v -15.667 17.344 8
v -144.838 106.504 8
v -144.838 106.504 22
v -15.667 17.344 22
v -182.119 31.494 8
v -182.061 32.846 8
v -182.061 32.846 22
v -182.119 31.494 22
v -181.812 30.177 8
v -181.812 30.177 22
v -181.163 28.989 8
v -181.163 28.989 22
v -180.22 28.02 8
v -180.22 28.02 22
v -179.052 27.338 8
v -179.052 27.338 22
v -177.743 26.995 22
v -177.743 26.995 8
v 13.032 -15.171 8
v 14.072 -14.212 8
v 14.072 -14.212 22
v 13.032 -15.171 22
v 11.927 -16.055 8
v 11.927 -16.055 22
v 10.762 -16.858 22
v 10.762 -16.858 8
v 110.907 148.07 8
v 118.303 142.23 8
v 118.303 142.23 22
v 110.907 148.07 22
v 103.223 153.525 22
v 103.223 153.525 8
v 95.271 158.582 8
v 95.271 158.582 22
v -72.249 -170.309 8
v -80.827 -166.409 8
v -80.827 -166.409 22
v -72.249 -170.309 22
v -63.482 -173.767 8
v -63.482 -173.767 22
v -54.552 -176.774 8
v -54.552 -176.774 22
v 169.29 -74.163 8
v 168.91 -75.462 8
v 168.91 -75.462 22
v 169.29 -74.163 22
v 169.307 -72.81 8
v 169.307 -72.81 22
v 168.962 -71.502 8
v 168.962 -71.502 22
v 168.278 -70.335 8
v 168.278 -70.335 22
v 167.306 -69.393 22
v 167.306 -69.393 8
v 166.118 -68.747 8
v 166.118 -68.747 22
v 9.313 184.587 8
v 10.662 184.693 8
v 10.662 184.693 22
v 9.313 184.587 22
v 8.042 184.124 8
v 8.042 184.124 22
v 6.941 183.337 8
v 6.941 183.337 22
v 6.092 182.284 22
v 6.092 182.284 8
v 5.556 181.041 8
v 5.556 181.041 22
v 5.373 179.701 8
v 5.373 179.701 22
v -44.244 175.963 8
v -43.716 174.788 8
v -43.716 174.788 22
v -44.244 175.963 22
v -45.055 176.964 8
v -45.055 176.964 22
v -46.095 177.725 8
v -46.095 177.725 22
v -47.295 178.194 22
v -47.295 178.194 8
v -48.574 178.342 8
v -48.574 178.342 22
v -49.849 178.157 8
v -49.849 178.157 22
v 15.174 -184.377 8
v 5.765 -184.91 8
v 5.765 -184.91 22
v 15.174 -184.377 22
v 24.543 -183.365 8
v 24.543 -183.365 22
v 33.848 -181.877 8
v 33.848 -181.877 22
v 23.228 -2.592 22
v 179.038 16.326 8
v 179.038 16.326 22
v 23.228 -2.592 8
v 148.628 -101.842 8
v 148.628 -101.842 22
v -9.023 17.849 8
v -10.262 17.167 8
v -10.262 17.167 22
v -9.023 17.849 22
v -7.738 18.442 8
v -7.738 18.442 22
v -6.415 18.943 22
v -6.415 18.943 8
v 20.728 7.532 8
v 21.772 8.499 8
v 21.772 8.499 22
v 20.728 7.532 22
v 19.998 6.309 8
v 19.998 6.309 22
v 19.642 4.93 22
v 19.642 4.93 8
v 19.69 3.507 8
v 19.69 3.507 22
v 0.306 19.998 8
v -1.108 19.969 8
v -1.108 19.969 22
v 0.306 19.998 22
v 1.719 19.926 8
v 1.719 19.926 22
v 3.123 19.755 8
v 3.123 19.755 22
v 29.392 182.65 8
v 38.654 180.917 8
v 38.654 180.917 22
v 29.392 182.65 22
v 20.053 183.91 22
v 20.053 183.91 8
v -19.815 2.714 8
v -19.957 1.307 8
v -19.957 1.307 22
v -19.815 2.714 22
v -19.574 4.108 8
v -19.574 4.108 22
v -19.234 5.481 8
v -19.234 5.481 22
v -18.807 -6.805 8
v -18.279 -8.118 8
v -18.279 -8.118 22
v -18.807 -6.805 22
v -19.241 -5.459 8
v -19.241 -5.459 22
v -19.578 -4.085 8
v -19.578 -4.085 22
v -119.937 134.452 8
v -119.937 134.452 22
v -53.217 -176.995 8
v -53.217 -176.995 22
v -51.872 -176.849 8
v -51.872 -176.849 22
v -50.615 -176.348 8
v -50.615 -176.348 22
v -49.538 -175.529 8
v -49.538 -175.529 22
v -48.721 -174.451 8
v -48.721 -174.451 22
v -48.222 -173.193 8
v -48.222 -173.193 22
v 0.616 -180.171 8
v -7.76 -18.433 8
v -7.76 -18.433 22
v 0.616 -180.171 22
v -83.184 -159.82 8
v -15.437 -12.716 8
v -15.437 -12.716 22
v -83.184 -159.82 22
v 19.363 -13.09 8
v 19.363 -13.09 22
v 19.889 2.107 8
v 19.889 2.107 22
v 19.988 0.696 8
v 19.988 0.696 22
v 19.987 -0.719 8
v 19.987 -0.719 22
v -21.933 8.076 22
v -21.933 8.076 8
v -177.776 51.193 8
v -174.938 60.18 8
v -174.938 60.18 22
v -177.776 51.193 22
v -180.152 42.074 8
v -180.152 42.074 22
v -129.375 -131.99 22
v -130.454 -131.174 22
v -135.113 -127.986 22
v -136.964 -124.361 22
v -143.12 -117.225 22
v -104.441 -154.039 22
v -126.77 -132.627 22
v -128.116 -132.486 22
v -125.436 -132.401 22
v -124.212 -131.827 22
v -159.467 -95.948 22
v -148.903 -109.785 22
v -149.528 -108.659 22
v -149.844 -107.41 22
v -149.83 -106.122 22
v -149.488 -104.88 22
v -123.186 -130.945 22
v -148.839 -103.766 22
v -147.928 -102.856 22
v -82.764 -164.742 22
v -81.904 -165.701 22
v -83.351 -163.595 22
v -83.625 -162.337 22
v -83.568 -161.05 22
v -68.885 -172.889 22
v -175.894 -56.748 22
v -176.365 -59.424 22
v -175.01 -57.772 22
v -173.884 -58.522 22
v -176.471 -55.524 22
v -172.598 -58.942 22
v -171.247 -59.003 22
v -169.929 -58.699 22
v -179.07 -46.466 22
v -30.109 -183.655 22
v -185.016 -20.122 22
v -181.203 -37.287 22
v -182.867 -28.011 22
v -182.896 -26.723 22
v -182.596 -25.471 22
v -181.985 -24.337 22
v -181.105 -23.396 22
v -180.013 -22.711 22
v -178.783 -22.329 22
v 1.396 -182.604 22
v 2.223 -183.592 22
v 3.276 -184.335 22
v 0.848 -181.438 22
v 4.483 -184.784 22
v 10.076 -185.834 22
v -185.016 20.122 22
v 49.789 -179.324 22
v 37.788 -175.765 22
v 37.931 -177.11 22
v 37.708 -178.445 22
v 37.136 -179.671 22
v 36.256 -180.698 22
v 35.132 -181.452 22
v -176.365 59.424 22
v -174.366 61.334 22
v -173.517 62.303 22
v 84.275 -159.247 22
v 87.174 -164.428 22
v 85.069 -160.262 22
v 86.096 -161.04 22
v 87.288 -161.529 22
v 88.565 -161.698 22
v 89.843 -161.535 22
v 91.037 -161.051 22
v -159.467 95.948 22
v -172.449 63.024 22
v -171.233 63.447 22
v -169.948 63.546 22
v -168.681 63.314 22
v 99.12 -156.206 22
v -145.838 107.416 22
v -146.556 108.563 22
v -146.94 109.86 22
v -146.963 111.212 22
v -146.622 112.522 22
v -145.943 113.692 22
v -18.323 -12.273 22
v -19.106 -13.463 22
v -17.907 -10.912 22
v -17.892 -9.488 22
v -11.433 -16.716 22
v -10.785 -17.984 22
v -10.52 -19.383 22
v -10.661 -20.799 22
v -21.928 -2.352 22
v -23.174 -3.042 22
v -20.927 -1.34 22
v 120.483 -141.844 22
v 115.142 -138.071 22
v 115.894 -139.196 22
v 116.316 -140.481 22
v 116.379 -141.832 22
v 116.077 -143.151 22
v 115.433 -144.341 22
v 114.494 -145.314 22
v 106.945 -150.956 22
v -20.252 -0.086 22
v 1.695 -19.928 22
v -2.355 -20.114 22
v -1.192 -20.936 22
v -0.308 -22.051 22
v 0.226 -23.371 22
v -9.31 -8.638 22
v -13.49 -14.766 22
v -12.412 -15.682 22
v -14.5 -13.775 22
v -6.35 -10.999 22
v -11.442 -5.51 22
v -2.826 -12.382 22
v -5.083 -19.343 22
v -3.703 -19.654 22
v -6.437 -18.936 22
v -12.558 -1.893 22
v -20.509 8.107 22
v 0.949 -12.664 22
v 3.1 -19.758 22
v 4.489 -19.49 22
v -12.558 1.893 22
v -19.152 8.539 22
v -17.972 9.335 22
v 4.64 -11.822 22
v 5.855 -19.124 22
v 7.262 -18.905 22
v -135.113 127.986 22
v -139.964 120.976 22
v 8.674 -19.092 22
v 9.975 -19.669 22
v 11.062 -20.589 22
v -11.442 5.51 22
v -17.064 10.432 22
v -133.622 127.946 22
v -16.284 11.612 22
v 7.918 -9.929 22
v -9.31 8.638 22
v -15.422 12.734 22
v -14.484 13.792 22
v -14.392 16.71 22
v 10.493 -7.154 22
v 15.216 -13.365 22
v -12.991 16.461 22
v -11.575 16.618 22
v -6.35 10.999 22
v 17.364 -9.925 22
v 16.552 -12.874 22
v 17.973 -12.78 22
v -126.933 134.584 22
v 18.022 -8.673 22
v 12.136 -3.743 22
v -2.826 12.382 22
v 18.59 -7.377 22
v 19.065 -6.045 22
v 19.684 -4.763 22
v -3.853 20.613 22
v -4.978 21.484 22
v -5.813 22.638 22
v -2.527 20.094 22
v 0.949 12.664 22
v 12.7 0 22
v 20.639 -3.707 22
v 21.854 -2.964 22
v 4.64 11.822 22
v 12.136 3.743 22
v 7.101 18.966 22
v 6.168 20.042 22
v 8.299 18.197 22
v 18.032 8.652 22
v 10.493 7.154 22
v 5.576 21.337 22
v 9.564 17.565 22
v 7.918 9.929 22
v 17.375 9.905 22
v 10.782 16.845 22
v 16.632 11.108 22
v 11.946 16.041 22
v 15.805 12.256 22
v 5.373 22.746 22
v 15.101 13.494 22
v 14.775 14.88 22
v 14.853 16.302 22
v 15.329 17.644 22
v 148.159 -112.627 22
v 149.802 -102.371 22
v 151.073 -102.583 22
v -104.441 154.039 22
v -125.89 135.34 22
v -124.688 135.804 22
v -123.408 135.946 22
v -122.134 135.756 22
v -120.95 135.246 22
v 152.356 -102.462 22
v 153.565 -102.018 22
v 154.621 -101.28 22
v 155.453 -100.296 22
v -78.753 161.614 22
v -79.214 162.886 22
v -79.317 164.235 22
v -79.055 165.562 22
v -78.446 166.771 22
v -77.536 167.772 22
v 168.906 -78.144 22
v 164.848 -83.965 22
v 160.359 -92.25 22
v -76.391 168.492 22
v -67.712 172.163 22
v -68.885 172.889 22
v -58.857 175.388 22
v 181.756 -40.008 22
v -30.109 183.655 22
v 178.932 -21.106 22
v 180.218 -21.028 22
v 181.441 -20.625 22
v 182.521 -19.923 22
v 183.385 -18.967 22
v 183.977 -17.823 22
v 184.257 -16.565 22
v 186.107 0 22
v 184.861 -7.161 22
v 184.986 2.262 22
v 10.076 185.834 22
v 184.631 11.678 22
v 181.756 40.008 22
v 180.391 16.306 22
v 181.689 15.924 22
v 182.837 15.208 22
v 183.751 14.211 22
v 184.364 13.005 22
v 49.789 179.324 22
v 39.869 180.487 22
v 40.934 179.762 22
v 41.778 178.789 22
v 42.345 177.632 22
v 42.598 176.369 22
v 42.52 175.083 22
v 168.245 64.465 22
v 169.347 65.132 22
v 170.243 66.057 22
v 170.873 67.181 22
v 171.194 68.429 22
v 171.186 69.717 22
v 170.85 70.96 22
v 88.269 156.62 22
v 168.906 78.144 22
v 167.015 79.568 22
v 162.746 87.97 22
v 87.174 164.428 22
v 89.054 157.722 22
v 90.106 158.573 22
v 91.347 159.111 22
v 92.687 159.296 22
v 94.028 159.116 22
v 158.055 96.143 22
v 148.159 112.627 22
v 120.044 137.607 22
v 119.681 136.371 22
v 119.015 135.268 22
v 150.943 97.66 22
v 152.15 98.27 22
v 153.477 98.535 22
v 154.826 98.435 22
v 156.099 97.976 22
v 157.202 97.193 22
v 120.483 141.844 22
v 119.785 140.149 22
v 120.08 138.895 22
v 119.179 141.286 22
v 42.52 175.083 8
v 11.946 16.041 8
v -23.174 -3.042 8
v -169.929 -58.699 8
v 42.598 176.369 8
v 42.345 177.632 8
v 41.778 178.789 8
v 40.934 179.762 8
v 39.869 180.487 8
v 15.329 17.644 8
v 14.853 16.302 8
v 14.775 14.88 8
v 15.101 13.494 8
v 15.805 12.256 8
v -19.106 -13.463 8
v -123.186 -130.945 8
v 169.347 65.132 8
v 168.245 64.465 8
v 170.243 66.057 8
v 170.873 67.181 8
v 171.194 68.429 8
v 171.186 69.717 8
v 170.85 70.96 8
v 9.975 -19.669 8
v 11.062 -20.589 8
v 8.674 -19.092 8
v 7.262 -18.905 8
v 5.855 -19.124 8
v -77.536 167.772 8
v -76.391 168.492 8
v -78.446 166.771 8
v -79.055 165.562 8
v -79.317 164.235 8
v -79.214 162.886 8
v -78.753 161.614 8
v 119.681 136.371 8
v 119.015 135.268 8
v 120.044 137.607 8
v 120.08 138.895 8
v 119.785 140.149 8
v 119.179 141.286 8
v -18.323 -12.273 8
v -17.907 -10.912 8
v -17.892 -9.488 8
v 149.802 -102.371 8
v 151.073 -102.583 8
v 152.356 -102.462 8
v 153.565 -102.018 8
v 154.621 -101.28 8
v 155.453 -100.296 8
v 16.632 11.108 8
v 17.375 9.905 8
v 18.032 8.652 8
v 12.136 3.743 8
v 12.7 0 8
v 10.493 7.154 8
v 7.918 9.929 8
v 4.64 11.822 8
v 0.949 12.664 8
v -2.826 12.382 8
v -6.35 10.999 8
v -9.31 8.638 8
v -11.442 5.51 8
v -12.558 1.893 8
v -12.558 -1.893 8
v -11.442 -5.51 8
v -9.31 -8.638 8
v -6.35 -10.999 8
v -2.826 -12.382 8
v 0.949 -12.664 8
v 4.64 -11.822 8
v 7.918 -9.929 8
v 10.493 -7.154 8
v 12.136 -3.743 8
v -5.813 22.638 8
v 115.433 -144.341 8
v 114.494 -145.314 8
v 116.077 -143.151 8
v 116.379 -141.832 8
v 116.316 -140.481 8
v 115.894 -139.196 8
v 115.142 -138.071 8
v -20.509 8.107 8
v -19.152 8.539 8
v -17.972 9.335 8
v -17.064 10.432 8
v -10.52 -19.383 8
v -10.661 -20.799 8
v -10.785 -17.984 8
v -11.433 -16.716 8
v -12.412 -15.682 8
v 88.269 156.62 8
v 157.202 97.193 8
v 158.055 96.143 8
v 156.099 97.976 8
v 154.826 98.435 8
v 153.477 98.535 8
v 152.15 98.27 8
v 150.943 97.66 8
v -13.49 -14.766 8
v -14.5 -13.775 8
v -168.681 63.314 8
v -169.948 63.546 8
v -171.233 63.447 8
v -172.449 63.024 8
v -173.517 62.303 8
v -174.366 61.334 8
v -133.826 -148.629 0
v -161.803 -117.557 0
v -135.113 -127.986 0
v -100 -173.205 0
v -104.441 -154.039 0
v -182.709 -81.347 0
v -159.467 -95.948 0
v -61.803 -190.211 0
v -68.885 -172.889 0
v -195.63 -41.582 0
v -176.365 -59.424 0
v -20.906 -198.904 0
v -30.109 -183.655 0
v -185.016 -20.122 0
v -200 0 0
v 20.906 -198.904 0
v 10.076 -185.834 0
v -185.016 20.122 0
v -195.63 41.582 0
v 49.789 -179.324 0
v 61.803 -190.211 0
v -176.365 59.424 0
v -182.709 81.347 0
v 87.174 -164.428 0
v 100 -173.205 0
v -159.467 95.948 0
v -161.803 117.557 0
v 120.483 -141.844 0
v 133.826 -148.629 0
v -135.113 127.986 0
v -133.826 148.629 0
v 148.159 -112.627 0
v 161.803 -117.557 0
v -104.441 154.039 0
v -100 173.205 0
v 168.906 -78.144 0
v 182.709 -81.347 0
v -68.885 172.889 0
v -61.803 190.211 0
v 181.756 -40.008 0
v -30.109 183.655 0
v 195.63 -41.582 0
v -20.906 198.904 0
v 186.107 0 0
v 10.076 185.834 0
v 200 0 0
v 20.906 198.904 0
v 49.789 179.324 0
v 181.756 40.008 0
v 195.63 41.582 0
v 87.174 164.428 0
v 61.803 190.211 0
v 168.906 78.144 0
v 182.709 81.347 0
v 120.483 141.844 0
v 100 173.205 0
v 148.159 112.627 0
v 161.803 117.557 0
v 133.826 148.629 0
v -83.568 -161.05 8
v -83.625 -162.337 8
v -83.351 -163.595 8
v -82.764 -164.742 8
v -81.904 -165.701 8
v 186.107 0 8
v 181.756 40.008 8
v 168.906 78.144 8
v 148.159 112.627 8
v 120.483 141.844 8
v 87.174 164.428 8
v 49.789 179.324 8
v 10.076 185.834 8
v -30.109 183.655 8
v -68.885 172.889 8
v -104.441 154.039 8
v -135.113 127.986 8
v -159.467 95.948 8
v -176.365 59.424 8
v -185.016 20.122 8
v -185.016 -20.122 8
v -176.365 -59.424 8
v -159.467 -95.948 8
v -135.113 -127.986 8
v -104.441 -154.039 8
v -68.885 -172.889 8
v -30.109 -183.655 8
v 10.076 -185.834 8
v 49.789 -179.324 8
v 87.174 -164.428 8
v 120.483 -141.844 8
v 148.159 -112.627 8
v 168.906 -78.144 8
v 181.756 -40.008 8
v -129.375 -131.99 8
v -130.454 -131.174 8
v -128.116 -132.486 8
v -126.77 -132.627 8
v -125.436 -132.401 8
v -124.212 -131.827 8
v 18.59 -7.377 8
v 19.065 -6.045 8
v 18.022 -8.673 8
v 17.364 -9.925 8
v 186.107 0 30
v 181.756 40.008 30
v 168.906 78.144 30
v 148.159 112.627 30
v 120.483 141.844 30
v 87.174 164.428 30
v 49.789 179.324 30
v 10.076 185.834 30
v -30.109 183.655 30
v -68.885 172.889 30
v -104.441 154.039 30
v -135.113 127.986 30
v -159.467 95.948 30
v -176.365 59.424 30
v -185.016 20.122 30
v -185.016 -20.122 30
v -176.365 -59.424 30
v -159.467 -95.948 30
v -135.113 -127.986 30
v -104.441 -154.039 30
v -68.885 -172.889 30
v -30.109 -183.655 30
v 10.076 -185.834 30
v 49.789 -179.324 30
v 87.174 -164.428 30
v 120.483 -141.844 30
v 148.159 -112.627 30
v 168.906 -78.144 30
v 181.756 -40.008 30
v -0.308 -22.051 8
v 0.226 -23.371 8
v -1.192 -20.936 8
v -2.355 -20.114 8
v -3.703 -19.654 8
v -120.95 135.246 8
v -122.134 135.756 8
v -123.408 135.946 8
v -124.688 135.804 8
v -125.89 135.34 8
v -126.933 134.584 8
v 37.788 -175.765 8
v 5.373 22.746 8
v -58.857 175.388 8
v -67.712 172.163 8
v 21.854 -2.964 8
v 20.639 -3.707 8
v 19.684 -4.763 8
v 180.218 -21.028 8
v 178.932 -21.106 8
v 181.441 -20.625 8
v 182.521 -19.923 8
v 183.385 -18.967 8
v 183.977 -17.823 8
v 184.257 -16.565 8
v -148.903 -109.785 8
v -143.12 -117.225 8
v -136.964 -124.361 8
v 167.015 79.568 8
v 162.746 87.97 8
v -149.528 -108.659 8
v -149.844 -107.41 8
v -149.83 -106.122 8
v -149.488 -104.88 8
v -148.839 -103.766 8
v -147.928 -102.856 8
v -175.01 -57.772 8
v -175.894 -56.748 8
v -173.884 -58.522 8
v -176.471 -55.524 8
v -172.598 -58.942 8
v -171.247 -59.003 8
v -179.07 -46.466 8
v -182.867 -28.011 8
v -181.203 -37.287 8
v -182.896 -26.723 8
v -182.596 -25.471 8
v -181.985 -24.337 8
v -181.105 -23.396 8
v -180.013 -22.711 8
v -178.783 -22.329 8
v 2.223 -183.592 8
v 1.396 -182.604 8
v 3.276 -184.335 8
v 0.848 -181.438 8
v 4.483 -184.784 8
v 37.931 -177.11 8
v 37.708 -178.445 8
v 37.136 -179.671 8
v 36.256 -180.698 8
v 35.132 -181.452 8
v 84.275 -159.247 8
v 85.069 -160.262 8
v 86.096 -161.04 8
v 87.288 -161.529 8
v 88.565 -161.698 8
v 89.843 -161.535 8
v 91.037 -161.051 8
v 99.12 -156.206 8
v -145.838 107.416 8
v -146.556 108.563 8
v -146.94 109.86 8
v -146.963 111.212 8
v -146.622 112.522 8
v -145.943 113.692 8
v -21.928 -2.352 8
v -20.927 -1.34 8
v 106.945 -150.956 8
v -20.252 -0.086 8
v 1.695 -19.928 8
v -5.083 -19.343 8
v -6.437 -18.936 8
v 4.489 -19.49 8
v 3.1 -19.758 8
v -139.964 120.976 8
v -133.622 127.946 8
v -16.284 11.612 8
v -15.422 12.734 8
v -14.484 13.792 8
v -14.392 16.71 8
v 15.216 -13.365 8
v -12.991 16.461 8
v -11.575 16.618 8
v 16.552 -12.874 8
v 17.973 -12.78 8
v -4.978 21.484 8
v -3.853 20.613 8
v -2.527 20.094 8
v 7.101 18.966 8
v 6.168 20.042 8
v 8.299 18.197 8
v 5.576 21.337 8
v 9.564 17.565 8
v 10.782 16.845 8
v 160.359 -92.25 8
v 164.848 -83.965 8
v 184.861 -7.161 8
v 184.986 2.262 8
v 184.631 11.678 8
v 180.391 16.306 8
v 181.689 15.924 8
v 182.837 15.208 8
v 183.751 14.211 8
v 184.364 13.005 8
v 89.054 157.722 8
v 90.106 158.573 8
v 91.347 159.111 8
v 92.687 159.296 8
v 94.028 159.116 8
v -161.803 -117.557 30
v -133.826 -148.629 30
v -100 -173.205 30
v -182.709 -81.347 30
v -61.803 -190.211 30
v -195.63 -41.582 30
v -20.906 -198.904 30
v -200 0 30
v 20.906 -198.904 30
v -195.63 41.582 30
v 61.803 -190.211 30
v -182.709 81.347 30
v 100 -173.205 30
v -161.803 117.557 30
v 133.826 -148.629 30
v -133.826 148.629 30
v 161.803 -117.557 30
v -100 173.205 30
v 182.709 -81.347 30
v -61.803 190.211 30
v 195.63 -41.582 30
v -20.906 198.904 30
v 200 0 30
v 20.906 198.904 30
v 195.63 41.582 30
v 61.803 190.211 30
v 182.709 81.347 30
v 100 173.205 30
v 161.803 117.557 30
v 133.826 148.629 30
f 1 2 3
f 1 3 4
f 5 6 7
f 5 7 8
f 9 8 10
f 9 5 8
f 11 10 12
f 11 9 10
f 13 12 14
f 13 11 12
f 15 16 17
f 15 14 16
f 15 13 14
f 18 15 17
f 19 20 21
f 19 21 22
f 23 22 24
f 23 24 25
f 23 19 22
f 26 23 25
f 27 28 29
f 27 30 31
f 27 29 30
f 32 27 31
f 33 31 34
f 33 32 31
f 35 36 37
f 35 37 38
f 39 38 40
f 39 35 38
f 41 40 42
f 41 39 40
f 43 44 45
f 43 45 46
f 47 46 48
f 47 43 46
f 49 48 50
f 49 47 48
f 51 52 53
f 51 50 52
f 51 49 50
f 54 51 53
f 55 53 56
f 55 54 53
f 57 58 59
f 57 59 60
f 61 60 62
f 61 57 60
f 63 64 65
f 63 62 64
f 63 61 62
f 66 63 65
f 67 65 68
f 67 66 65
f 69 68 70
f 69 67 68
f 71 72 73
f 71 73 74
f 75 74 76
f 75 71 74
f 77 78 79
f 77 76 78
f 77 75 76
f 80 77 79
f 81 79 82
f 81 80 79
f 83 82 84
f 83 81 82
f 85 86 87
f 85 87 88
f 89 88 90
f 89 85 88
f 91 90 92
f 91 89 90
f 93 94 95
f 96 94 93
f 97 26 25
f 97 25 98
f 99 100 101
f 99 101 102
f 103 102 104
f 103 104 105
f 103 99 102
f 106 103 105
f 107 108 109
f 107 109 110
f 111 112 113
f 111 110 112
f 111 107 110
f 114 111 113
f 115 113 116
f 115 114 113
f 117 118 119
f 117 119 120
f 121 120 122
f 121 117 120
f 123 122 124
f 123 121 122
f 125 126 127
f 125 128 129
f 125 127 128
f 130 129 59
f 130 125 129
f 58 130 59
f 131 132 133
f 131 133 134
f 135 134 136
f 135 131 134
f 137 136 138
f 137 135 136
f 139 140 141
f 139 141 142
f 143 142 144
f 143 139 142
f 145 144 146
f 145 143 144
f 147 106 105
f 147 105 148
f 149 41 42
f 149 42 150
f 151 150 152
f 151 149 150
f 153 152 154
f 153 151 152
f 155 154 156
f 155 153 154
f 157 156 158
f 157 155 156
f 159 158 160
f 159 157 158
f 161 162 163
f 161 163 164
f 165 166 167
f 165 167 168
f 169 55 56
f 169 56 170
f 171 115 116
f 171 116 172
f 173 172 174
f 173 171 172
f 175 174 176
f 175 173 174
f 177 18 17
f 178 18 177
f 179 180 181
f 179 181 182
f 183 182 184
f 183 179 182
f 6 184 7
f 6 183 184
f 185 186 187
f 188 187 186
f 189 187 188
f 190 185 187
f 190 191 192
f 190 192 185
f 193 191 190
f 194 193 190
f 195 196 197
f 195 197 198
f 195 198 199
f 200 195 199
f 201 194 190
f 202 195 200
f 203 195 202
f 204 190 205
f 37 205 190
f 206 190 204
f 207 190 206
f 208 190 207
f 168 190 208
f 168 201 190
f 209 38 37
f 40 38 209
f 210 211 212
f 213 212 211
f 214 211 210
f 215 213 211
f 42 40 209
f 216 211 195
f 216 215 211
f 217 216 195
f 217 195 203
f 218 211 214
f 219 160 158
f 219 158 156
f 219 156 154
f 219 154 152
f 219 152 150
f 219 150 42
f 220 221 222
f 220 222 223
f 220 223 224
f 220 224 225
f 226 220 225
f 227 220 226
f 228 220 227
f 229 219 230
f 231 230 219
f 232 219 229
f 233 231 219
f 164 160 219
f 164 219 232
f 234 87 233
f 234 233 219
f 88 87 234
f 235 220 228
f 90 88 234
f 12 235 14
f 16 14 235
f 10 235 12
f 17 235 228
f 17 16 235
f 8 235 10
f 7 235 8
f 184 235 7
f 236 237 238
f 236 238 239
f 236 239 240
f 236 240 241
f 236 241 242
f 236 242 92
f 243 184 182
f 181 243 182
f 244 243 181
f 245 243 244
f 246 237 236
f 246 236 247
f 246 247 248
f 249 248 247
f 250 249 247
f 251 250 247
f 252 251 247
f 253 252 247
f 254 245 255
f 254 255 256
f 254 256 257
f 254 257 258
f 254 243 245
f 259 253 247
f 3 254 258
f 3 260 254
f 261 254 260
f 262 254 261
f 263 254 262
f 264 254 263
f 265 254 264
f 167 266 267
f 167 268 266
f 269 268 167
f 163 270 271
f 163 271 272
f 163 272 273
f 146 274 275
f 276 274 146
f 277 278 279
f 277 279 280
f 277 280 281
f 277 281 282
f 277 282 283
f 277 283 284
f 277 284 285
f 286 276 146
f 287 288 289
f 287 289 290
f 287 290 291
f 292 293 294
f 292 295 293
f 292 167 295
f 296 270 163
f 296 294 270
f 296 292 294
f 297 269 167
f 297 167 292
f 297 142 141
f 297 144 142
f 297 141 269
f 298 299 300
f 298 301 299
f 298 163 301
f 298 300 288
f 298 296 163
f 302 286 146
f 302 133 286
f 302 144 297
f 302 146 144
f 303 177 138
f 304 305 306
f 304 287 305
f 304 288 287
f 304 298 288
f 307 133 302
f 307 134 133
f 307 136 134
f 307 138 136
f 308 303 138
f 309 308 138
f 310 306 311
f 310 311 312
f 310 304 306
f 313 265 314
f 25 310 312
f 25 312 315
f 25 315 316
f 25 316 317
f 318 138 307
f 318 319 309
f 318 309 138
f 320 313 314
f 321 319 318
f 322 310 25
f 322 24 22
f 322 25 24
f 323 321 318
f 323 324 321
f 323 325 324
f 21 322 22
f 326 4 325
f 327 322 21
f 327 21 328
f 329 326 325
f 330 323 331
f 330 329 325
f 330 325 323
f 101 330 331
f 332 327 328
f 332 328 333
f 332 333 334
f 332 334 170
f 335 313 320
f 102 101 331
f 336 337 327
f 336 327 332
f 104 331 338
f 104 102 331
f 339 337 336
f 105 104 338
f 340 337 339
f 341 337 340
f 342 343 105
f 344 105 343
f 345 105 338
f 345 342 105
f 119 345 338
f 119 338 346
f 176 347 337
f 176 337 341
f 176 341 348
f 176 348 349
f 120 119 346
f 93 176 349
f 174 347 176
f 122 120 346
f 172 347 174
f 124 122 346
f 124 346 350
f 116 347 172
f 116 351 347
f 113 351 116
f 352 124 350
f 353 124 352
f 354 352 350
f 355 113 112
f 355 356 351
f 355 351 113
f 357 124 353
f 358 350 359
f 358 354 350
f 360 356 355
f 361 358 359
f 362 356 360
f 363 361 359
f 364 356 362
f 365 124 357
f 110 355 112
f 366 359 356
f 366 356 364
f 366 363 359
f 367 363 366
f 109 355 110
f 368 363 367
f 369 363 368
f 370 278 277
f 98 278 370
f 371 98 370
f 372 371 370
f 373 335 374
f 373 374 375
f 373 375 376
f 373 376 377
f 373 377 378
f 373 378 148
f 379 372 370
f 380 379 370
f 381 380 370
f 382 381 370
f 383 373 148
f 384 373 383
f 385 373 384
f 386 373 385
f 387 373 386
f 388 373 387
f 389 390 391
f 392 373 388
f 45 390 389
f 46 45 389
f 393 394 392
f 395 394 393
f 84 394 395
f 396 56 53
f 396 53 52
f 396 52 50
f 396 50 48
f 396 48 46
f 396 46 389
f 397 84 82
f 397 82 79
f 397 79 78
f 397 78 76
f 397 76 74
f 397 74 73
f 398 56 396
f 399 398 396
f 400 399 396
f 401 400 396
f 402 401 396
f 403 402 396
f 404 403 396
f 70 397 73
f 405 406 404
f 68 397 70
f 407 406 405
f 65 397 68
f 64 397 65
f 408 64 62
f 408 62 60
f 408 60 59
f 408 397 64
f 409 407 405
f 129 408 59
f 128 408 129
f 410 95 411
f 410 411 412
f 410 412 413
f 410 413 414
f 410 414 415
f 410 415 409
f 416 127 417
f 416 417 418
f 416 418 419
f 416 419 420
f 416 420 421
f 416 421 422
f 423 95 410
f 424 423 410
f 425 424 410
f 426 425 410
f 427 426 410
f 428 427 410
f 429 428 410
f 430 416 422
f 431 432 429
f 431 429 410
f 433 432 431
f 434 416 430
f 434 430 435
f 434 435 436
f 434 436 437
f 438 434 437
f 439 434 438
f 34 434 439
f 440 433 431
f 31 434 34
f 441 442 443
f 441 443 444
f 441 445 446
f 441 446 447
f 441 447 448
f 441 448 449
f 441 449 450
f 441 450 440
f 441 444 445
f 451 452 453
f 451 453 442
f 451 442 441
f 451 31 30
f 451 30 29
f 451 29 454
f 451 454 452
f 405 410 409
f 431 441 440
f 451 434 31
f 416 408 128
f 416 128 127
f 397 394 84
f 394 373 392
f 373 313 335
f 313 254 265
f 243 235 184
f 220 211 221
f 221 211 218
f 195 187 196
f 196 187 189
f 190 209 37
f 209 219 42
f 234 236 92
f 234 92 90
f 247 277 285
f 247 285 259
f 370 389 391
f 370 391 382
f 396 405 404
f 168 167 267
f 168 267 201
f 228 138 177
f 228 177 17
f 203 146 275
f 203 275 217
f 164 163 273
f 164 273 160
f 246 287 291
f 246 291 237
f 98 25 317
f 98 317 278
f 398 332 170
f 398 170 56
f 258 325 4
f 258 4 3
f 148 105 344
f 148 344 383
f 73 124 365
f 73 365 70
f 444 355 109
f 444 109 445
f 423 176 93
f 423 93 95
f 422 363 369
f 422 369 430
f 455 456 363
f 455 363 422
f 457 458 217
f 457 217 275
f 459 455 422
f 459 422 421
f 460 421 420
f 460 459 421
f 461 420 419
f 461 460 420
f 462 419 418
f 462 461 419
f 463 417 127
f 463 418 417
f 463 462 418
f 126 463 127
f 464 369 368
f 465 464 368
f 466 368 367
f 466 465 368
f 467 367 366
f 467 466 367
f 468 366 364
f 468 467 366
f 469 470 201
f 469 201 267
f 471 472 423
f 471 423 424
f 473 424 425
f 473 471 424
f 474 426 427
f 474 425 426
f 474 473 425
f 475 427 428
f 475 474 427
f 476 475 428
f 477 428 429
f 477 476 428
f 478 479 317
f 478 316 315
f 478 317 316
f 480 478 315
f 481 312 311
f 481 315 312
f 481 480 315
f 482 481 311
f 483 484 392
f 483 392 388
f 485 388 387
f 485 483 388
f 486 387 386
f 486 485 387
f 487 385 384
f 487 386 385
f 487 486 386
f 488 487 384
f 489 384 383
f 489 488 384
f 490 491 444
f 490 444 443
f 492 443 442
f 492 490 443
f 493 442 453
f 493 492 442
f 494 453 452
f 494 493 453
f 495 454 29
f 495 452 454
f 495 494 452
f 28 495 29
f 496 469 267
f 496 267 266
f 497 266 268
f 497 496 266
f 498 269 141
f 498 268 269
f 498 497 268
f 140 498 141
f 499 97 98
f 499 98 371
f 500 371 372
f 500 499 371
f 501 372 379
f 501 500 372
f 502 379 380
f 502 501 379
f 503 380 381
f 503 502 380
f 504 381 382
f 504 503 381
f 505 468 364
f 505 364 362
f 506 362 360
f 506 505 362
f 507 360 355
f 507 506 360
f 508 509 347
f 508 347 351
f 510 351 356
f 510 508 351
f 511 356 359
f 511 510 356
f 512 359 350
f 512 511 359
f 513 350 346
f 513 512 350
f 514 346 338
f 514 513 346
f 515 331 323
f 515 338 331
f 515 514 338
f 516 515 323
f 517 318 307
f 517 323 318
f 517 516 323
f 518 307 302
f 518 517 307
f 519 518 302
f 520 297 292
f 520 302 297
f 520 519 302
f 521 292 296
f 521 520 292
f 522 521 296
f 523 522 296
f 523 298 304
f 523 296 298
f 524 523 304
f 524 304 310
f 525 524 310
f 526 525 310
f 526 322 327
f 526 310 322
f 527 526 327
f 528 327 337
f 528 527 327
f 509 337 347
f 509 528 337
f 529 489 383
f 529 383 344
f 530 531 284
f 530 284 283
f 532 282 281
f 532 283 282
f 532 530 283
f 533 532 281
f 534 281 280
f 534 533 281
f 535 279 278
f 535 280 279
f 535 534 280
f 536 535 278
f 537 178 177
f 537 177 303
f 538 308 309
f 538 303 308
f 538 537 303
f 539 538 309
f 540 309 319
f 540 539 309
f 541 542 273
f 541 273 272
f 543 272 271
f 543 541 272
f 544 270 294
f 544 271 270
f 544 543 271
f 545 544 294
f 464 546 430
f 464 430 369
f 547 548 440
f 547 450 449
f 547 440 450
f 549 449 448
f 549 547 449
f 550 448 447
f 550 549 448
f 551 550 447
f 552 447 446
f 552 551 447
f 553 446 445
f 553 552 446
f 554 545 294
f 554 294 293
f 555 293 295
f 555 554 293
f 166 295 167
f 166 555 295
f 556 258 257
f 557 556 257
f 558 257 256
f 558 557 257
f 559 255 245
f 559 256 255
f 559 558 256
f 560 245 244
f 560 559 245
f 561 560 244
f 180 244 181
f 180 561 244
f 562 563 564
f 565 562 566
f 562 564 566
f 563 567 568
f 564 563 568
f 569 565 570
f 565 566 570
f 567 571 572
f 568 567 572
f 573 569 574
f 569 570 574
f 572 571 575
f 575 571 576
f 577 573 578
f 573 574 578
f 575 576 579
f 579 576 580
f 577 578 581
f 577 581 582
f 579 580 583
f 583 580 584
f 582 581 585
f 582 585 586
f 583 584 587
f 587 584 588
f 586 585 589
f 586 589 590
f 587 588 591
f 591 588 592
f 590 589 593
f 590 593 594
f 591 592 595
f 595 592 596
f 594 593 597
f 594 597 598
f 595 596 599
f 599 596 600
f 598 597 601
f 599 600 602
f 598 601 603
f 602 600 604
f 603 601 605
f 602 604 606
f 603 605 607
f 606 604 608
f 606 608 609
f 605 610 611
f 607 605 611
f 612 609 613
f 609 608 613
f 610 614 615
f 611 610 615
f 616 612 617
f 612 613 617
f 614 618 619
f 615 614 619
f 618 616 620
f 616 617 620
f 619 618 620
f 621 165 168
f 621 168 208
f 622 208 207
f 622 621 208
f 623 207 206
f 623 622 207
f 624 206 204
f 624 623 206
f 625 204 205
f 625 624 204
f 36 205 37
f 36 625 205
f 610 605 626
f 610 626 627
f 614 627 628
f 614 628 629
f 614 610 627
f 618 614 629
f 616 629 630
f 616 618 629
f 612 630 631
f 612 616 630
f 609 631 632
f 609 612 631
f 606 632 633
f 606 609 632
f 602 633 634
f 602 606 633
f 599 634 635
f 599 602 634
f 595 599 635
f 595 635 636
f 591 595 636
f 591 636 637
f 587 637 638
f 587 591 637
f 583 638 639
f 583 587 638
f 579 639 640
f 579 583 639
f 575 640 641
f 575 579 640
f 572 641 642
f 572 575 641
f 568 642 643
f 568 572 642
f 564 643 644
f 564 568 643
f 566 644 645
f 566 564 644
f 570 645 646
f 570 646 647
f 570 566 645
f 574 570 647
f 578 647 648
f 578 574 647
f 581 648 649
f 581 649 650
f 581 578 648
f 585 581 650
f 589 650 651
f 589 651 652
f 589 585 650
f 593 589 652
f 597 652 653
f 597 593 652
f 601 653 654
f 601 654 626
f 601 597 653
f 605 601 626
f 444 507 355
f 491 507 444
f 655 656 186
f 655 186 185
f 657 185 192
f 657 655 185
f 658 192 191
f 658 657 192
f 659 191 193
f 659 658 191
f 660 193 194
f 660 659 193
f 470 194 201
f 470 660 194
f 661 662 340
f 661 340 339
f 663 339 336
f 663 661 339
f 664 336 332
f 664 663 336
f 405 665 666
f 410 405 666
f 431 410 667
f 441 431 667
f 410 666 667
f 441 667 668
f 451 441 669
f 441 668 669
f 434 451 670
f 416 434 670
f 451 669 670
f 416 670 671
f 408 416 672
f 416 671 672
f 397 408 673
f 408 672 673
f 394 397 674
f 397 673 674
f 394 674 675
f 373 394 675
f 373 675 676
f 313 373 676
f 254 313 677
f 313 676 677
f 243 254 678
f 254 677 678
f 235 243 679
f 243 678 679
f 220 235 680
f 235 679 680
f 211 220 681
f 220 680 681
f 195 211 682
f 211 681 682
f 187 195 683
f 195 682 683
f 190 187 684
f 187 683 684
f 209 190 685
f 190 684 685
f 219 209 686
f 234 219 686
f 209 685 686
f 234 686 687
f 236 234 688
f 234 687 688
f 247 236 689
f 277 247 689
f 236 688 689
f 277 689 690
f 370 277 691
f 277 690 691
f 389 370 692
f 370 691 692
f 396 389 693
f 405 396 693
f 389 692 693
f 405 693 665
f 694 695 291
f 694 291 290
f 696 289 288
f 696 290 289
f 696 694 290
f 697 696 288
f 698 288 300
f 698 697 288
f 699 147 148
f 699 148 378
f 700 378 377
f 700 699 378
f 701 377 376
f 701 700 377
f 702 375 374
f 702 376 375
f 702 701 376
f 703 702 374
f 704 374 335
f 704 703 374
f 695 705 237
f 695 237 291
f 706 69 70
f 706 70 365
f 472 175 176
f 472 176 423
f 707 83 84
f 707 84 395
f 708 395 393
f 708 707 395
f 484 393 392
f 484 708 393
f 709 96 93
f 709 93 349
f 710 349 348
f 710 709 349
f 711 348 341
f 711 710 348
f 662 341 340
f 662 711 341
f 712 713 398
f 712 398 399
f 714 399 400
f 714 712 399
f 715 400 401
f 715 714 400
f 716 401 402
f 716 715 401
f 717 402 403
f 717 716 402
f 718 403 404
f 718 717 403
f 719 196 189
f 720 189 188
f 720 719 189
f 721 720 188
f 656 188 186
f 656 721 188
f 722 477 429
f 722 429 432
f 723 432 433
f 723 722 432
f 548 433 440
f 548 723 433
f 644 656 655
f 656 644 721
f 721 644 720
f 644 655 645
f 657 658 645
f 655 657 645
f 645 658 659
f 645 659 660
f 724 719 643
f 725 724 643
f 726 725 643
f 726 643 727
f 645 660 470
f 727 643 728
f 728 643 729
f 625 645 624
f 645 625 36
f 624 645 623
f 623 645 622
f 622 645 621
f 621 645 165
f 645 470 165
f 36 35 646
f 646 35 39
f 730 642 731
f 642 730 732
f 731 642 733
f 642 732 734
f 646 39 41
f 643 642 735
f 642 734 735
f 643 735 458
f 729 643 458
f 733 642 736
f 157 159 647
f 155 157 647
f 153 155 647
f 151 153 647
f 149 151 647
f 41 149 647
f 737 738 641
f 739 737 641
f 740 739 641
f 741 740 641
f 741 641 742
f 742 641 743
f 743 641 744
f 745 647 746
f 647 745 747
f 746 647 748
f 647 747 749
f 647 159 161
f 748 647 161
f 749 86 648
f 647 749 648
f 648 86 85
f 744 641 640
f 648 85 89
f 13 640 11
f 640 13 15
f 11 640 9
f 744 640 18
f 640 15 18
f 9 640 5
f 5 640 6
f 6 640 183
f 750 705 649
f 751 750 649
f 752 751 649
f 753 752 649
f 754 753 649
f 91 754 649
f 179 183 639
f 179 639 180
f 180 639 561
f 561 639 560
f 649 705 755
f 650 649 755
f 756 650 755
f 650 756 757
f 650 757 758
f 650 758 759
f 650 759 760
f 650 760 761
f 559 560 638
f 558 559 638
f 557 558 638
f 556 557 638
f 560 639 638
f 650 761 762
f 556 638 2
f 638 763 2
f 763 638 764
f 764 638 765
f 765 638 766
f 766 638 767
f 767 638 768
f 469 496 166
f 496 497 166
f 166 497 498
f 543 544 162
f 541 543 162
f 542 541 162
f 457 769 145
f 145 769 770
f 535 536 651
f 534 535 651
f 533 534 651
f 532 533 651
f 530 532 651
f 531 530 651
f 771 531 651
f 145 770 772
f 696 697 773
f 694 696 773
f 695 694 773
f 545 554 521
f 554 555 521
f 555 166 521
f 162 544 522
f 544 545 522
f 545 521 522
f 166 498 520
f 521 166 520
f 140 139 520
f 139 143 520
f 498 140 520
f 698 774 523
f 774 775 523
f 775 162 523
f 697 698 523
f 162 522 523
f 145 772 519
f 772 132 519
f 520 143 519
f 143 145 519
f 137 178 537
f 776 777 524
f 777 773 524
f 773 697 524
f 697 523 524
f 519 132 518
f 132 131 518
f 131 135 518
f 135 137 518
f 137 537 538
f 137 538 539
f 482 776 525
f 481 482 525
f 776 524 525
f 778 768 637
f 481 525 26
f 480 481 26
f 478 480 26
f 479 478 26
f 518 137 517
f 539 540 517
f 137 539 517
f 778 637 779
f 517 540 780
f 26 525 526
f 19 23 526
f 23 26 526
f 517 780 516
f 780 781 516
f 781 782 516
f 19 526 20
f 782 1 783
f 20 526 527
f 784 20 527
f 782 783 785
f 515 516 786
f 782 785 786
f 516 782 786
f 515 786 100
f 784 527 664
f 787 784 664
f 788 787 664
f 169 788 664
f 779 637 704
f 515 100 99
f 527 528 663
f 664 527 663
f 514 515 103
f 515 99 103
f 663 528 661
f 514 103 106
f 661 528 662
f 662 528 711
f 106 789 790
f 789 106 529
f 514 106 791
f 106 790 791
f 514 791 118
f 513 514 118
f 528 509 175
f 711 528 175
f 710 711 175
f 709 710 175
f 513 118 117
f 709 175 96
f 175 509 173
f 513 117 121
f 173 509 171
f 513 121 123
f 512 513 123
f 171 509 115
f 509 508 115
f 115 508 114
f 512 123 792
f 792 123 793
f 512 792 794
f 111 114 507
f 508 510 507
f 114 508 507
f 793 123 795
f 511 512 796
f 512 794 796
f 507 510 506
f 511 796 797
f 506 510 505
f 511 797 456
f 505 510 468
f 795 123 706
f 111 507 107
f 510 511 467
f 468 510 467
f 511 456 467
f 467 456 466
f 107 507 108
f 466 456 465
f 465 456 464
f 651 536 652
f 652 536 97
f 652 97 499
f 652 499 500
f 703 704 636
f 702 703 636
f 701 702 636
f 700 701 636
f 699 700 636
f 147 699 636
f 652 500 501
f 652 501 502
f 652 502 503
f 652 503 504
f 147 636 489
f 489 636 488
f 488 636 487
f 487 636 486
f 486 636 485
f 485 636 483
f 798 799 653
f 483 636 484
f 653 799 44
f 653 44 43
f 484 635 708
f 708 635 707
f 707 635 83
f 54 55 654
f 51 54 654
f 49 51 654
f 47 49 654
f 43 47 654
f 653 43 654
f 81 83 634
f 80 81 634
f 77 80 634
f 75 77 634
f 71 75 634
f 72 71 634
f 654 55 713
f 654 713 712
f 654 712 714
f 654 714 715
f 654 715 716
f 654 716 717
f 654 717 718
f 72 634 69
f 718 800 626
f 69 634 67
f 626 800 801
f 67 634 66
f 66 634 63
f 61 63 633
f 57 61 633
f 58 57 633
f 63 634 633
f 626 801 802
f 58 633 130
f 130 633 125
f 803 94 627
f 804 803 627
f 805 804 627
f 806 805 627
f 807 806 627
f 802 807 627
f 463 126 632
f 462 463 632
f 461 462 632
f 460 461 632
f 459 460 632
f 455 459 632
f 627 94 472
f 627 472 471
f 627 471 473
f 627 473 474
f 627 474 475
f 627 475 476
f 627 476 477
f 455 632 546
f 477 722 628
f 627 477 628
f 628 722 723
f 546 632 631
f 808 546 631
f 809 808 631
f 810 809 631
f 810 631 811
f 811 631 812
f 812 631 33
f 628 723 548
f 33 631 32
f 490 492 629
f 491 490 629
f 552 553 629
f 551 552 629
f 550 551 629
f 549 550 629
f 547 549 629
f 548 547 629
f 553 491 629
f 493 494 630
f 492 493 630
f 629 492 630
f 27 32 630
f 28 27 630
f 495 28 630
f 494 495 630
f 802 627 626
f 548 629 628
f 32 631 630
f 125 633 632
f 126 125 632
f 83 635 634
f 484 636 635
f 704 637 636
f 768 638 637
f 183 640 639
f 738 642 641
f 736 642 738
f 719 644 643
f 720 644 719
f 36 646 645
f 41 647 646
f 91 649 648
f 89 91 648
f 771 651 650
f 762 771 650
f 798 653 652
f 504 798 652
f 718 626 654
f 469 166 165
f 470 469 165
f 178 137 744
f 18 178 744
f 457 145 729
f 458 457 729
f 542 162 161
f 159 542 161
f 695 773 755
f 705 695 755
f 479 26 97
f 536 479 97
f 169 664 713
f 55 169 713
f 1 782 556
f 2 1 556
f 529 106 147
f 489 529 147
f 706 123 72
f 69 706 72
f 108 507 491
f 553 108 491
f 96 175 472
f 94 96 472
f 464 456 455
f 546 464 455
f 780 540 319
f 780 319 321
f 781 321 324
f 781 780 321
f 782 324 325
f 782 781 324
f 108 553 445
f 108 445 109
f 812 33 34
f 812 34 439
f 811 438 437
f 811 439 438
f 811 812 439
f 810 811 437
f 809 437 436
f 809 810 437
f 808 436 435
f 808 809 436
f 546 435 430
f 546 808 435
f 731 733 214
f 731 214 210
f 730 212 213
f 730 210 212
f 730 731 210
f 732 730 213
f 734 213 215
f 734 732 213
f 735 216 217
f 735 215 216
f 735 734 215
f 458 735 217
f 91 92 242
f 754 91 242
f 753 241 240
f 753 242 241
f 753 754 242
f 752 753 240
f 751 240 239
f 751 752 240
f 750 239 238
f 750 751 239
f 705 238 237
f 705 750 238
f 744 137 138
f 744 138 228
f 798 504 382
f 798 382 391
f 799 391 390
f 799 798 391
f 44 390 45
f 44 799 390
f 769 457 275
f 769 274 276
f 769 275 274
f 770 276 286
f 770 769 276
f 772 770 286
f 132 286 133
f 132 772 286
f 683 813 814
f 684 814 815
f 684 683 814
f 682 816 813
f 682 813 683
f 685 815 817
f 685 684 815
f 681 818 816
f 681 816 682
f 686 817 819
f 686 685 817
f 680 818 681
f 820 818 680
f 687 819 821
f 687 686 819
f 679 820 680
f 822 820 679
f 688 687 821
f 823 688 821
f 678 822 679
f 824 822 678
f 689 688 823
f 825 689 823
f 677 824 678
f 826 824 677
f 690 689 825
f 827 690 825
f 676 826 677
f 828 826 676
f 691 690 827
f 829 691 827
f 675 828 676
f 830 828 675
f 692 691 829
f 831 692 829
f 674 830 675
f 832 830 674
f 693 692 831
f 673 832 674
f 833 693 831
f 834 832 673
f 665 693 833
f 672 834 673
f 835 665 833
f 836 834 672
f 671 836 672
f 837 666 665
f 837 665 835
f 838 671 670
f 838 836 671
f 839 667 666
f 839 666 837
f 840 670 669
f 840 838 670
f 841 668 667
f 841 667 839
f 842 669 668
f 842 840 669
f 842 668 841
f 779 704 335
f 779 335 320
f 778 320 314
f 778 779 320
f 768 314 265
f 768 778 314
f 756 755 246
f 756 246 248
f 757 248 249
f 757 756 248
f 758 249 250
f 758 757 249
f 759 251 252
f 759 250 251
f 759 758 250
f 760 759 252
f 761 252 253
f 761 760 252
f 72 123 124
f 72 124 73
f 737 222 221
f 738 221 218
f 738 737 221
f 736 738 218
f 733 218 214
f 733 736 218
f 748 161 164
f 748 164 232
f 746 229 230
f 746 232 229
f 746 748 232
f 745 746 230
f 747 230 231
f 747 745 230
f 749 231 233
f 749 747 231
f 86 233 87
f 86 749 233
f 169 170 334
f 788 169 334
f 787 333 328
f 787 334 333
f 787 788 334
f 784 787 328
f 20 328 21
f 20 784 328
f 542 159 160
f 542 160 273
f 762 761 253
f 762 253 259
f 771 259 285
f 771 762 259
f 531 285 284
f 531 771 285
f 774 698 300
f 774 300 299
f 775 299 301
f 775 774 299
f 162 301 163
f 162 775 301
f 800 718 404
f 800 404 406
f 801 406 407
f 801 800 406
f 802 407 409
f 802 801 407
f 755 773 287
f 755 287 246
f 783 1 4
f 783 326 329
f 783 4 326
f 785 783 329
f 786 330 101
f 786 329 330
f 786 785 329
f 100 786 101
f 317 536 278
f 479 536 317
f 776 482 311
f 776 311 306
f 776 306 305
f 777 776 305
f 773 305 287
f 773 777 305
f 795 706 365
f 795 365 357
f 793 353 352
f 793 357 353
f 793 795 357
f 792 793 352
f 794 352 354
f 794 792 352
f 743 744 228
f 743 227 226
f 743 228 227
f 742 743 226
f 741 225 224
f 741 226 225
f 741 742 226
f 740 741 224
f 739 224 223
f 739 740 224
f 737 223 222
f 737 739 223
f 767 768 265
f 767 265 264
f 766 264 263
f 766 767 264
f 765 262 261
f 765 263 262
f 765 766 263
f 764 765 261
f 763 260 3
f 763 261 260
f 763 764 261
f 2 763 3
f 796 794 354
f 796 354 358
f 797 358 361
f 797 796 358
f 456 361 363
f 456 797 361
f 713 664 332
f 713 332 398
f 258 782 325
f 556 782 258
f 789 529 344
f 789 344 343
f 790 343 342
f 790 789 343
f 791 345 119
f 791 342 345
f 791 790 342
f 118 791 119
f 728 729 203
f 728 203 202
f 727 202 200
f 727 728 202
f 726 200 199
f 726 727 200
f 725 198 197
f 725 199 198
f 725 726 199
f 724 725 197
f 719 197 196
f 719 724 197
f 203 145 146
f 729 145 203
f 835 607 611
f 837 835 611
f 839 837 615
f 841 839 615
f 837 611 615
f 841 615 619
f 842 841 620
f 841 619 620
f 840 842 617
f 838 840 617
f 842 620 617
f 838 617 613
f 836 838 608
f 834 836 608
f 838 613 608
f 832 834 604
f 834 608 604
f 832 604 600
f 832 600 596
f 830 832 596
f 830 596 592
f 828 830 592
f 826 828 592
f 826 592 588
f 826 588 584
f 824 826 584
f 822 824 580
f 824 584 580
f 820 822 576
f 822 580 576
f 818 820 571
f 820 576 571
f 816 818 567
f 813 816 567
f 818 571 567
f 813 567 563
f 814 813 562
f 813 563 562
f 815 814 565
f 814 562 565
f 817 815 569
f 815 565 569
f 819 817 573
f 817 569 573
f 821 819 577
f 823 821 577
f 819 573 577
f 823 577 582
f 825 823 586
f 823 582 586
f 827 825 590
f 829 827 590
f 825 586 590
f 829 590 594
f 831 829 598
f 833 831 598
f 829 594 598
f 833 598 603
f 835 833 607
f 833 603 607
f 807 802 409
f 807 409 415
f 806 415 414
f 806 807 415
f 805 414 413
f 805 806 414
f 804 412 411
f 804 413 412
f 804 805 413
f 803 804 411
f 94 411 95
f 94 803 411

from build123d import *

# Parameters (mm, degrees)
SKETCH1_R           = 200
SKETCH1_R_2         = 12.7
BOSS_EXTRUDE1_DEPTH = 30
SKETCH2_R           = 186.107166766
CUT_EXTRUDE3_DEPTH  = 8


with BuildPart() as part:
    # Sketch1 → Boss-Extrude1 (new body)
    with BuildSketch(Plane.XY):
        Circle(SKETCH1_R)
        Circle(SKETCH1_R_2, mode=Mode.SUBTRACT)
        with BuildLine():
            Line((5.373353022, 179.700844592), (5.373353022, 22.746286446))
            ThreePointArc((5.373353022, 22.746286446), (6.167799965, 20.041970731), (8.298682417, 18.197029157))
            ThreePointArc((8.298682417, 18.197029157), (10.179469581, 17.215644021), (11.945725569, 16.040562354))
            Line((11.945725569, 16.040562354), (42.519793553, 175.083108319))
            ThreePointArc((42.519793553, 175.083108319), (41.777732217, 178.788808127), (38.654411976, 180.916656046))
            ThreePointArc((38.654411976, 180.916656046), (24.73012638, 183.339632511), (10.661501717, 184.69253472))
            ThreePointArc((10.661501717, 184.69253472), (6.941206716, 183.336827504), (5.373353022, 179.700844592))
        make_face(mode=Mode.SUBTRACT)
        with BuildLine():
            Line((88.269014329, 156.620073998), (15.3285942, 17.643714734))
            ThreePointArc((15.3285942, 17.643714734), (14.775283856, 14.879964185), (15.804699463, 12.256079099))
            ThreePointArc((15.804699463, 12.256079099), (17.013981377, 10.51306034), (18.031835705, 8.651757112))
            Line((18.031835705, 8.651757112), (119.01458488, 135.268459916))
            ThreePointArc((119.01458488, 135.268459916), (120.079646768, 138.894547239), (118.302944275, 142.23014229))
            ThreePointArc((118.302944275, 142.23014229), (107.099615, 150.846519571), (95.271191525, 158.582470864))
            ThreePointArc((95.271191525, 158.582470864), (91.347005342, 159.110959035), (88.269014329, 156.620073998))
        make_face(mode=Mode.SUBTRACT)
        with BuildLine():
            Line((150.94330821, 97.659531928), (21.772239177, 8.499180607))
            ThreePointArc((21.772239177, 8.499180607), (19.997928277, 6.309137168), (19.690050329, 3.507409022))
            ThreePointArc((19.690050329, 3.507409022), (19.950795079, 1.402061232), (19.987069587, -0.719061419))
            Line((19.987069587, -0.719061419), (168.244569093, 64.465437509))
            ThreePointArc((168.244569093, 64.465437509), (170.872761362, 67.181219439), (170.849697746, 70.960416994))
            ThreePointArc((170.849697746, 70.960416994), (164.933872514, 83.796286896), (158.055399498, 96.14307406))
            ThreePointArc((158.055399498, 96.14307406), (154.826305895, 98.434687345), (150.94330821, 97.659531928))
        make_face(mode=Mode.SUBTRACT)
        with BuildLine():
            Line((179.038309244, 16.326368018), (23.228126543, -2.592413372))
            ThreePointArc((23.228126543, -2.592413372), (20.639288331, -3.707037141), (19.064647955, -6.044766194))
            ThreePointArc((19.064647955, -6.044766194), (18.317122063, -8.030133208), (17.363506697, -9.925151645))
            Line((17.363506697, -9.925151645), (178.931750093, -21.10583974))
            ThreePointArc((178.931750093, -21.10583974), (182.520985567, -19.922516113), (184.256844426, -16.565484669))
            ThreePointArc((184.256844426, -16.565484669), (184.983767504, -2.450665253), (184.631020219, 11.678457638))
            ThreePointArc((184.631020219, 11.678457638), (182.836765627, 15.208215052), (179.038309244, 16.326368018))
        make_face(mode=Mode.SUBTRACT)
        with BuildLine():
            Line((166.117791277, -68.746970051), (19.362730047, -13.090116689))
            ThreePointArc((19.362730047, -13.090116689), (16.552436159, -12.873973916), (14.071764489, -14.212158322))
            ThreePointArc((14.071764489, -14.212158322), (12.487217127, -15.622720904), (10.762173676, -16.85750924))
            Line((10.762173676, -16.85750924), (148.627823508, -101.842023456))
            ThreePointArc((148.627823508, -101.842023456), (152.355851595, -102.462243316), (155.452968583, -100.29643343))
            ThreePointArc((155.452968583, -100.29643343), (162.656110654, -88.136199526), (168.909899254, -75.461552688))
            ThreePointArc((168.909899254, -75.461552688), (168.961525775, -71.502276031), (166.117791277, -68.746970051))
        make_face(mode=Mode.SUBTRACT)
        with BuildLine():
            Line((115.141689264, -138.071205772), (11.061565443, -20.589032025))
            ThreePointArc((11.061565443, -20.589032025), (8.673620341, -19.091638415), (5.855209362, -19.123716253))
            ThreePointArc((5.855209362, -19.123716253), (3.796641234, -19.636331514), (1.695356364, -19.928014623))
            Line((1.695356364, -19.928014623), (84.275053717, -159.247426929))
            ThreePointArc((84.275053717, -159.247426929), (87.28782811, -161.529105379), (91.036691049, -161.050677996))
            ThreePointArc((91.036691049, -161.050677996), (103.065899072, -153.630792644), (114.493555954, -145.314230704))
            ThreePointArc((114.493555954, -145.314230704), (116.379236576, -141.832457371), (115.141689264, -138.071205772))
        make_face(mode=Mode.SUBTRACT)
        with BuildLine():
            Line((37.788013848, -175.764992189), (0.226329502, -23.37124825))
            ThreePointArc((0.226329502, -23.37124825), (-1.192217369, -20.935638632), (-3.702703668, -19.654261257))
            ThreePointArc((-3.702703668, -19.654261257), (-5.76369941, -19.151495219), (-7.75984666, -18.433252014))
            Line((-7.75984666, -18.433252014), (0.615884744, -180.171164031))
            ThreePointArc((0.615884744, -180.171164031), (2.223215138, -183.591596036), (5.765004707, -184.910153103))
            ThreePointArc((5.765004707, -184.910153103), (19.864532092, -183.930422619), (33.848118782, -181.877169691))
            ThreePointArc((33.848118782, -181.877169691), (37.135866798, -179.670531994), (37.788013848, -175.764992189))
        make_face(mode=Mode.SUBTRACT)
        with BuildLine():
            Line((-48.222440145, -173.193137093), (-10.660755799, -20.799393154))
            ThreePointArc((-10.660755799, -20.799393154), (-10.784932447, -17.98353634), (-12.412371909, -15.682251866))
            ThreePointArc((-12.412371909, -15.682251866), (-14.00364598, -14.279282169), (-15.43736233, -12.715653514))
            Line((-15.43736233, -12.715653514), (-83.184376002, -159.819858752))
            ThreePointArc((-83.184376002, -159.819858752), (-83.350709631, -163.59546456), (-80.827374738, -166.408940544))
            ThreePointArc((-80.827374738, -166.408940544), (-67.887559797, -172.093809374), (-54.551514489, -176.77424096))
            ThreePointArc((-54.551514489, -176.77424096), (-50.614882527, -176.348253002), (-48.222440145, -173.193137093))
        make_face(mode=Mode.SUBTRACT)
        with BuildLine():
            Line((-123.185714244, -130.944821493), (-19.105590424, -13.462647747))
            ThreePointArc((-19.105590424, -13.462647747), (-17.906949474, -10.911622598), (-18.278515332, -8.117627564))
            ThreePointArc((-18.278515332, -8.117627564), (-19.035526018, -6.135857658), (-19.578364331, -4.085052034))
            Line((-19.578364331, -4.085052034), (-147.928098686, -102.855749871))
            ThreePointArc((-147.928098686, -102.855749871), (-149.829991307, -106.121583693), (-148.903176705, -109.785445151))
            ThreePointArc((-148.903176705, -109.785445151), (-140.087429871, -120.832578356), (-130.454053207, -131.174463985))
            ThreePointArc((-130.454053207, -131.174463985), (-126.77037224, -132.626714474), (-123.185714244, -130.944821493))
        make_face(mode=Mode.SUBTRACT)
        with BuildLine():
            Line((-169.928625759, -58.698625345), (-23.173564529, -3.041771983))
            ThreePointArc((-23.173564529, -3.041771983), (-20.926700178, -1.339987618), (-19.957271172, 1.306647384))
            ThreePointArc((-19.957271172, 1.306647384), (-19.706596449, 3.413217897), (-19.234199009, 5.481385637))
            Line((-19.234199009, 5.481385637), (-178.783276688, -22.328628241))
            ThreePointArc((-178.783276688, -22.328628241), (-181.985027623, -24.336526905), (-182.867055368, -28.011427332))
            ThreePointArc((-182.867055368, -28.011427332), (-180.194957997, -41.890059828), (-176.471140477, -55.524198135))
            ThreePointArc((-176.471140477, -55.524198135), (-173.884297422, -58.521993984), (-169.928625759, -58.698625345))
        make_face(mode=Mode.SUBTRACT)
        with BuildLine():
            Line((-177.742936974, 26.994718474), (-21.932754273, 8.075937085))
            ThreePointArc((-21.932754273, 8.075937085), (-19.152396066, 8.538622377), (-17.064056697, 10.431585164))
            ThreePointArc((-17.064056697, 10.431585164), (-15.863123123, 12.180366365), (-14.483710491, 13.792103916))
            Line((-14.483710491, 13.792103916), (-168.681360573, 63.313713031))
            ThreePointArc((-168.681360573, 63.313713031), (-172.449487267, 63.02373491), (-174.938295432, 60.179670914))
            ThreePointArc((-174.938295432, 60.179670914), (-179.021992831, 46.648966577), (-182.060816172, 32.845992368))
            ThreePointArc((-182.060816172, 32.845992368), (-181.163425598, 28.98941006), (-177.742936974, 26.994718474))
        make_face(mode=Mode.SUBTRACT)
        with BuildLine():
            Line((-144.838483363, 106.503897613), (-15.667414331, 17.343546292))
            ThreePointArc((-15.667414331, 17.343546292), (-12.990508827, 16.461136886), (-10.261672478, 17.166772497))
            ThreePointArc((-10.261672478, 17.166772497), (-8.385599461, 18.157139689), (-6.415178447, 18.943217401))
            Line((-6.415178447, 18.943217401), (-119.936577581, 134.45164566))
            ThreePointArc((-119.936577581, 134.45164566), (-123.40784762, 135.946018575), (-126.933280248, 134.584331798))
            ThreePointArc((-126.933280248, 134.584331798), (-136.837246557, 124.50127692), (-145.942552953, 113.691561858))
            ThreePointArc((-145.942552953, 113.691561858), (-146.940196225, 109.85968962), (-144.838483363, 106.503897613))
        make_face(mode=Mode.SUBTRACT)
        with BuildLine():
            Line((-78.753278707, 161.61431732), (-5.812858579, 22.637958056))
            ThreePointArc((-5.812858579, 22.637958056), (-3.852652568, 20.612603314), (-1.10846276, 19.969259133))
            ThreePointArc((-1.10846276, 19.969259133), (1.01296398, 19.974331127), (3.122993668, 19.75466807))
            Line((3.122993668, 19.75466807), (-43.715770058, 174.788326586))
            ThreePointArc((-43.715770058, 174.788326586), (-46.094957309, 177.724707712), (-49.849380271, 178.157344184))
            ThreePointArc((-49.849380271, 178.157344184), (-63.304736163, 173.831845124), (-76.39060965, 168.491764657))
            ThreePointArc((-76.39060965, 168.491764657), (-79.054738718, 165.562438241), (-78.753278707, 161.61431732))
        make_face(mode=Mode.SUBTRACT)
    extrude(amount=BOSS_EXTRUDE1_DEPTH)

    # Sketch2 → Cut-Extrude3 (cut)
    with BuildSketch(Plane.XY):
        Circle(SKETCH2_R)
    cut_extrude3 = extrude(amount=CUT_EXTRUDE3_DEPTH, mode=Mode.SUBTRACT)

    # Mirror1: Cut-Extrude3 across plane
    add(cut_extrude3.mirror(Plane.XY.offset(15)), mode=Mode.SUBTRACT)


solid = part.part
